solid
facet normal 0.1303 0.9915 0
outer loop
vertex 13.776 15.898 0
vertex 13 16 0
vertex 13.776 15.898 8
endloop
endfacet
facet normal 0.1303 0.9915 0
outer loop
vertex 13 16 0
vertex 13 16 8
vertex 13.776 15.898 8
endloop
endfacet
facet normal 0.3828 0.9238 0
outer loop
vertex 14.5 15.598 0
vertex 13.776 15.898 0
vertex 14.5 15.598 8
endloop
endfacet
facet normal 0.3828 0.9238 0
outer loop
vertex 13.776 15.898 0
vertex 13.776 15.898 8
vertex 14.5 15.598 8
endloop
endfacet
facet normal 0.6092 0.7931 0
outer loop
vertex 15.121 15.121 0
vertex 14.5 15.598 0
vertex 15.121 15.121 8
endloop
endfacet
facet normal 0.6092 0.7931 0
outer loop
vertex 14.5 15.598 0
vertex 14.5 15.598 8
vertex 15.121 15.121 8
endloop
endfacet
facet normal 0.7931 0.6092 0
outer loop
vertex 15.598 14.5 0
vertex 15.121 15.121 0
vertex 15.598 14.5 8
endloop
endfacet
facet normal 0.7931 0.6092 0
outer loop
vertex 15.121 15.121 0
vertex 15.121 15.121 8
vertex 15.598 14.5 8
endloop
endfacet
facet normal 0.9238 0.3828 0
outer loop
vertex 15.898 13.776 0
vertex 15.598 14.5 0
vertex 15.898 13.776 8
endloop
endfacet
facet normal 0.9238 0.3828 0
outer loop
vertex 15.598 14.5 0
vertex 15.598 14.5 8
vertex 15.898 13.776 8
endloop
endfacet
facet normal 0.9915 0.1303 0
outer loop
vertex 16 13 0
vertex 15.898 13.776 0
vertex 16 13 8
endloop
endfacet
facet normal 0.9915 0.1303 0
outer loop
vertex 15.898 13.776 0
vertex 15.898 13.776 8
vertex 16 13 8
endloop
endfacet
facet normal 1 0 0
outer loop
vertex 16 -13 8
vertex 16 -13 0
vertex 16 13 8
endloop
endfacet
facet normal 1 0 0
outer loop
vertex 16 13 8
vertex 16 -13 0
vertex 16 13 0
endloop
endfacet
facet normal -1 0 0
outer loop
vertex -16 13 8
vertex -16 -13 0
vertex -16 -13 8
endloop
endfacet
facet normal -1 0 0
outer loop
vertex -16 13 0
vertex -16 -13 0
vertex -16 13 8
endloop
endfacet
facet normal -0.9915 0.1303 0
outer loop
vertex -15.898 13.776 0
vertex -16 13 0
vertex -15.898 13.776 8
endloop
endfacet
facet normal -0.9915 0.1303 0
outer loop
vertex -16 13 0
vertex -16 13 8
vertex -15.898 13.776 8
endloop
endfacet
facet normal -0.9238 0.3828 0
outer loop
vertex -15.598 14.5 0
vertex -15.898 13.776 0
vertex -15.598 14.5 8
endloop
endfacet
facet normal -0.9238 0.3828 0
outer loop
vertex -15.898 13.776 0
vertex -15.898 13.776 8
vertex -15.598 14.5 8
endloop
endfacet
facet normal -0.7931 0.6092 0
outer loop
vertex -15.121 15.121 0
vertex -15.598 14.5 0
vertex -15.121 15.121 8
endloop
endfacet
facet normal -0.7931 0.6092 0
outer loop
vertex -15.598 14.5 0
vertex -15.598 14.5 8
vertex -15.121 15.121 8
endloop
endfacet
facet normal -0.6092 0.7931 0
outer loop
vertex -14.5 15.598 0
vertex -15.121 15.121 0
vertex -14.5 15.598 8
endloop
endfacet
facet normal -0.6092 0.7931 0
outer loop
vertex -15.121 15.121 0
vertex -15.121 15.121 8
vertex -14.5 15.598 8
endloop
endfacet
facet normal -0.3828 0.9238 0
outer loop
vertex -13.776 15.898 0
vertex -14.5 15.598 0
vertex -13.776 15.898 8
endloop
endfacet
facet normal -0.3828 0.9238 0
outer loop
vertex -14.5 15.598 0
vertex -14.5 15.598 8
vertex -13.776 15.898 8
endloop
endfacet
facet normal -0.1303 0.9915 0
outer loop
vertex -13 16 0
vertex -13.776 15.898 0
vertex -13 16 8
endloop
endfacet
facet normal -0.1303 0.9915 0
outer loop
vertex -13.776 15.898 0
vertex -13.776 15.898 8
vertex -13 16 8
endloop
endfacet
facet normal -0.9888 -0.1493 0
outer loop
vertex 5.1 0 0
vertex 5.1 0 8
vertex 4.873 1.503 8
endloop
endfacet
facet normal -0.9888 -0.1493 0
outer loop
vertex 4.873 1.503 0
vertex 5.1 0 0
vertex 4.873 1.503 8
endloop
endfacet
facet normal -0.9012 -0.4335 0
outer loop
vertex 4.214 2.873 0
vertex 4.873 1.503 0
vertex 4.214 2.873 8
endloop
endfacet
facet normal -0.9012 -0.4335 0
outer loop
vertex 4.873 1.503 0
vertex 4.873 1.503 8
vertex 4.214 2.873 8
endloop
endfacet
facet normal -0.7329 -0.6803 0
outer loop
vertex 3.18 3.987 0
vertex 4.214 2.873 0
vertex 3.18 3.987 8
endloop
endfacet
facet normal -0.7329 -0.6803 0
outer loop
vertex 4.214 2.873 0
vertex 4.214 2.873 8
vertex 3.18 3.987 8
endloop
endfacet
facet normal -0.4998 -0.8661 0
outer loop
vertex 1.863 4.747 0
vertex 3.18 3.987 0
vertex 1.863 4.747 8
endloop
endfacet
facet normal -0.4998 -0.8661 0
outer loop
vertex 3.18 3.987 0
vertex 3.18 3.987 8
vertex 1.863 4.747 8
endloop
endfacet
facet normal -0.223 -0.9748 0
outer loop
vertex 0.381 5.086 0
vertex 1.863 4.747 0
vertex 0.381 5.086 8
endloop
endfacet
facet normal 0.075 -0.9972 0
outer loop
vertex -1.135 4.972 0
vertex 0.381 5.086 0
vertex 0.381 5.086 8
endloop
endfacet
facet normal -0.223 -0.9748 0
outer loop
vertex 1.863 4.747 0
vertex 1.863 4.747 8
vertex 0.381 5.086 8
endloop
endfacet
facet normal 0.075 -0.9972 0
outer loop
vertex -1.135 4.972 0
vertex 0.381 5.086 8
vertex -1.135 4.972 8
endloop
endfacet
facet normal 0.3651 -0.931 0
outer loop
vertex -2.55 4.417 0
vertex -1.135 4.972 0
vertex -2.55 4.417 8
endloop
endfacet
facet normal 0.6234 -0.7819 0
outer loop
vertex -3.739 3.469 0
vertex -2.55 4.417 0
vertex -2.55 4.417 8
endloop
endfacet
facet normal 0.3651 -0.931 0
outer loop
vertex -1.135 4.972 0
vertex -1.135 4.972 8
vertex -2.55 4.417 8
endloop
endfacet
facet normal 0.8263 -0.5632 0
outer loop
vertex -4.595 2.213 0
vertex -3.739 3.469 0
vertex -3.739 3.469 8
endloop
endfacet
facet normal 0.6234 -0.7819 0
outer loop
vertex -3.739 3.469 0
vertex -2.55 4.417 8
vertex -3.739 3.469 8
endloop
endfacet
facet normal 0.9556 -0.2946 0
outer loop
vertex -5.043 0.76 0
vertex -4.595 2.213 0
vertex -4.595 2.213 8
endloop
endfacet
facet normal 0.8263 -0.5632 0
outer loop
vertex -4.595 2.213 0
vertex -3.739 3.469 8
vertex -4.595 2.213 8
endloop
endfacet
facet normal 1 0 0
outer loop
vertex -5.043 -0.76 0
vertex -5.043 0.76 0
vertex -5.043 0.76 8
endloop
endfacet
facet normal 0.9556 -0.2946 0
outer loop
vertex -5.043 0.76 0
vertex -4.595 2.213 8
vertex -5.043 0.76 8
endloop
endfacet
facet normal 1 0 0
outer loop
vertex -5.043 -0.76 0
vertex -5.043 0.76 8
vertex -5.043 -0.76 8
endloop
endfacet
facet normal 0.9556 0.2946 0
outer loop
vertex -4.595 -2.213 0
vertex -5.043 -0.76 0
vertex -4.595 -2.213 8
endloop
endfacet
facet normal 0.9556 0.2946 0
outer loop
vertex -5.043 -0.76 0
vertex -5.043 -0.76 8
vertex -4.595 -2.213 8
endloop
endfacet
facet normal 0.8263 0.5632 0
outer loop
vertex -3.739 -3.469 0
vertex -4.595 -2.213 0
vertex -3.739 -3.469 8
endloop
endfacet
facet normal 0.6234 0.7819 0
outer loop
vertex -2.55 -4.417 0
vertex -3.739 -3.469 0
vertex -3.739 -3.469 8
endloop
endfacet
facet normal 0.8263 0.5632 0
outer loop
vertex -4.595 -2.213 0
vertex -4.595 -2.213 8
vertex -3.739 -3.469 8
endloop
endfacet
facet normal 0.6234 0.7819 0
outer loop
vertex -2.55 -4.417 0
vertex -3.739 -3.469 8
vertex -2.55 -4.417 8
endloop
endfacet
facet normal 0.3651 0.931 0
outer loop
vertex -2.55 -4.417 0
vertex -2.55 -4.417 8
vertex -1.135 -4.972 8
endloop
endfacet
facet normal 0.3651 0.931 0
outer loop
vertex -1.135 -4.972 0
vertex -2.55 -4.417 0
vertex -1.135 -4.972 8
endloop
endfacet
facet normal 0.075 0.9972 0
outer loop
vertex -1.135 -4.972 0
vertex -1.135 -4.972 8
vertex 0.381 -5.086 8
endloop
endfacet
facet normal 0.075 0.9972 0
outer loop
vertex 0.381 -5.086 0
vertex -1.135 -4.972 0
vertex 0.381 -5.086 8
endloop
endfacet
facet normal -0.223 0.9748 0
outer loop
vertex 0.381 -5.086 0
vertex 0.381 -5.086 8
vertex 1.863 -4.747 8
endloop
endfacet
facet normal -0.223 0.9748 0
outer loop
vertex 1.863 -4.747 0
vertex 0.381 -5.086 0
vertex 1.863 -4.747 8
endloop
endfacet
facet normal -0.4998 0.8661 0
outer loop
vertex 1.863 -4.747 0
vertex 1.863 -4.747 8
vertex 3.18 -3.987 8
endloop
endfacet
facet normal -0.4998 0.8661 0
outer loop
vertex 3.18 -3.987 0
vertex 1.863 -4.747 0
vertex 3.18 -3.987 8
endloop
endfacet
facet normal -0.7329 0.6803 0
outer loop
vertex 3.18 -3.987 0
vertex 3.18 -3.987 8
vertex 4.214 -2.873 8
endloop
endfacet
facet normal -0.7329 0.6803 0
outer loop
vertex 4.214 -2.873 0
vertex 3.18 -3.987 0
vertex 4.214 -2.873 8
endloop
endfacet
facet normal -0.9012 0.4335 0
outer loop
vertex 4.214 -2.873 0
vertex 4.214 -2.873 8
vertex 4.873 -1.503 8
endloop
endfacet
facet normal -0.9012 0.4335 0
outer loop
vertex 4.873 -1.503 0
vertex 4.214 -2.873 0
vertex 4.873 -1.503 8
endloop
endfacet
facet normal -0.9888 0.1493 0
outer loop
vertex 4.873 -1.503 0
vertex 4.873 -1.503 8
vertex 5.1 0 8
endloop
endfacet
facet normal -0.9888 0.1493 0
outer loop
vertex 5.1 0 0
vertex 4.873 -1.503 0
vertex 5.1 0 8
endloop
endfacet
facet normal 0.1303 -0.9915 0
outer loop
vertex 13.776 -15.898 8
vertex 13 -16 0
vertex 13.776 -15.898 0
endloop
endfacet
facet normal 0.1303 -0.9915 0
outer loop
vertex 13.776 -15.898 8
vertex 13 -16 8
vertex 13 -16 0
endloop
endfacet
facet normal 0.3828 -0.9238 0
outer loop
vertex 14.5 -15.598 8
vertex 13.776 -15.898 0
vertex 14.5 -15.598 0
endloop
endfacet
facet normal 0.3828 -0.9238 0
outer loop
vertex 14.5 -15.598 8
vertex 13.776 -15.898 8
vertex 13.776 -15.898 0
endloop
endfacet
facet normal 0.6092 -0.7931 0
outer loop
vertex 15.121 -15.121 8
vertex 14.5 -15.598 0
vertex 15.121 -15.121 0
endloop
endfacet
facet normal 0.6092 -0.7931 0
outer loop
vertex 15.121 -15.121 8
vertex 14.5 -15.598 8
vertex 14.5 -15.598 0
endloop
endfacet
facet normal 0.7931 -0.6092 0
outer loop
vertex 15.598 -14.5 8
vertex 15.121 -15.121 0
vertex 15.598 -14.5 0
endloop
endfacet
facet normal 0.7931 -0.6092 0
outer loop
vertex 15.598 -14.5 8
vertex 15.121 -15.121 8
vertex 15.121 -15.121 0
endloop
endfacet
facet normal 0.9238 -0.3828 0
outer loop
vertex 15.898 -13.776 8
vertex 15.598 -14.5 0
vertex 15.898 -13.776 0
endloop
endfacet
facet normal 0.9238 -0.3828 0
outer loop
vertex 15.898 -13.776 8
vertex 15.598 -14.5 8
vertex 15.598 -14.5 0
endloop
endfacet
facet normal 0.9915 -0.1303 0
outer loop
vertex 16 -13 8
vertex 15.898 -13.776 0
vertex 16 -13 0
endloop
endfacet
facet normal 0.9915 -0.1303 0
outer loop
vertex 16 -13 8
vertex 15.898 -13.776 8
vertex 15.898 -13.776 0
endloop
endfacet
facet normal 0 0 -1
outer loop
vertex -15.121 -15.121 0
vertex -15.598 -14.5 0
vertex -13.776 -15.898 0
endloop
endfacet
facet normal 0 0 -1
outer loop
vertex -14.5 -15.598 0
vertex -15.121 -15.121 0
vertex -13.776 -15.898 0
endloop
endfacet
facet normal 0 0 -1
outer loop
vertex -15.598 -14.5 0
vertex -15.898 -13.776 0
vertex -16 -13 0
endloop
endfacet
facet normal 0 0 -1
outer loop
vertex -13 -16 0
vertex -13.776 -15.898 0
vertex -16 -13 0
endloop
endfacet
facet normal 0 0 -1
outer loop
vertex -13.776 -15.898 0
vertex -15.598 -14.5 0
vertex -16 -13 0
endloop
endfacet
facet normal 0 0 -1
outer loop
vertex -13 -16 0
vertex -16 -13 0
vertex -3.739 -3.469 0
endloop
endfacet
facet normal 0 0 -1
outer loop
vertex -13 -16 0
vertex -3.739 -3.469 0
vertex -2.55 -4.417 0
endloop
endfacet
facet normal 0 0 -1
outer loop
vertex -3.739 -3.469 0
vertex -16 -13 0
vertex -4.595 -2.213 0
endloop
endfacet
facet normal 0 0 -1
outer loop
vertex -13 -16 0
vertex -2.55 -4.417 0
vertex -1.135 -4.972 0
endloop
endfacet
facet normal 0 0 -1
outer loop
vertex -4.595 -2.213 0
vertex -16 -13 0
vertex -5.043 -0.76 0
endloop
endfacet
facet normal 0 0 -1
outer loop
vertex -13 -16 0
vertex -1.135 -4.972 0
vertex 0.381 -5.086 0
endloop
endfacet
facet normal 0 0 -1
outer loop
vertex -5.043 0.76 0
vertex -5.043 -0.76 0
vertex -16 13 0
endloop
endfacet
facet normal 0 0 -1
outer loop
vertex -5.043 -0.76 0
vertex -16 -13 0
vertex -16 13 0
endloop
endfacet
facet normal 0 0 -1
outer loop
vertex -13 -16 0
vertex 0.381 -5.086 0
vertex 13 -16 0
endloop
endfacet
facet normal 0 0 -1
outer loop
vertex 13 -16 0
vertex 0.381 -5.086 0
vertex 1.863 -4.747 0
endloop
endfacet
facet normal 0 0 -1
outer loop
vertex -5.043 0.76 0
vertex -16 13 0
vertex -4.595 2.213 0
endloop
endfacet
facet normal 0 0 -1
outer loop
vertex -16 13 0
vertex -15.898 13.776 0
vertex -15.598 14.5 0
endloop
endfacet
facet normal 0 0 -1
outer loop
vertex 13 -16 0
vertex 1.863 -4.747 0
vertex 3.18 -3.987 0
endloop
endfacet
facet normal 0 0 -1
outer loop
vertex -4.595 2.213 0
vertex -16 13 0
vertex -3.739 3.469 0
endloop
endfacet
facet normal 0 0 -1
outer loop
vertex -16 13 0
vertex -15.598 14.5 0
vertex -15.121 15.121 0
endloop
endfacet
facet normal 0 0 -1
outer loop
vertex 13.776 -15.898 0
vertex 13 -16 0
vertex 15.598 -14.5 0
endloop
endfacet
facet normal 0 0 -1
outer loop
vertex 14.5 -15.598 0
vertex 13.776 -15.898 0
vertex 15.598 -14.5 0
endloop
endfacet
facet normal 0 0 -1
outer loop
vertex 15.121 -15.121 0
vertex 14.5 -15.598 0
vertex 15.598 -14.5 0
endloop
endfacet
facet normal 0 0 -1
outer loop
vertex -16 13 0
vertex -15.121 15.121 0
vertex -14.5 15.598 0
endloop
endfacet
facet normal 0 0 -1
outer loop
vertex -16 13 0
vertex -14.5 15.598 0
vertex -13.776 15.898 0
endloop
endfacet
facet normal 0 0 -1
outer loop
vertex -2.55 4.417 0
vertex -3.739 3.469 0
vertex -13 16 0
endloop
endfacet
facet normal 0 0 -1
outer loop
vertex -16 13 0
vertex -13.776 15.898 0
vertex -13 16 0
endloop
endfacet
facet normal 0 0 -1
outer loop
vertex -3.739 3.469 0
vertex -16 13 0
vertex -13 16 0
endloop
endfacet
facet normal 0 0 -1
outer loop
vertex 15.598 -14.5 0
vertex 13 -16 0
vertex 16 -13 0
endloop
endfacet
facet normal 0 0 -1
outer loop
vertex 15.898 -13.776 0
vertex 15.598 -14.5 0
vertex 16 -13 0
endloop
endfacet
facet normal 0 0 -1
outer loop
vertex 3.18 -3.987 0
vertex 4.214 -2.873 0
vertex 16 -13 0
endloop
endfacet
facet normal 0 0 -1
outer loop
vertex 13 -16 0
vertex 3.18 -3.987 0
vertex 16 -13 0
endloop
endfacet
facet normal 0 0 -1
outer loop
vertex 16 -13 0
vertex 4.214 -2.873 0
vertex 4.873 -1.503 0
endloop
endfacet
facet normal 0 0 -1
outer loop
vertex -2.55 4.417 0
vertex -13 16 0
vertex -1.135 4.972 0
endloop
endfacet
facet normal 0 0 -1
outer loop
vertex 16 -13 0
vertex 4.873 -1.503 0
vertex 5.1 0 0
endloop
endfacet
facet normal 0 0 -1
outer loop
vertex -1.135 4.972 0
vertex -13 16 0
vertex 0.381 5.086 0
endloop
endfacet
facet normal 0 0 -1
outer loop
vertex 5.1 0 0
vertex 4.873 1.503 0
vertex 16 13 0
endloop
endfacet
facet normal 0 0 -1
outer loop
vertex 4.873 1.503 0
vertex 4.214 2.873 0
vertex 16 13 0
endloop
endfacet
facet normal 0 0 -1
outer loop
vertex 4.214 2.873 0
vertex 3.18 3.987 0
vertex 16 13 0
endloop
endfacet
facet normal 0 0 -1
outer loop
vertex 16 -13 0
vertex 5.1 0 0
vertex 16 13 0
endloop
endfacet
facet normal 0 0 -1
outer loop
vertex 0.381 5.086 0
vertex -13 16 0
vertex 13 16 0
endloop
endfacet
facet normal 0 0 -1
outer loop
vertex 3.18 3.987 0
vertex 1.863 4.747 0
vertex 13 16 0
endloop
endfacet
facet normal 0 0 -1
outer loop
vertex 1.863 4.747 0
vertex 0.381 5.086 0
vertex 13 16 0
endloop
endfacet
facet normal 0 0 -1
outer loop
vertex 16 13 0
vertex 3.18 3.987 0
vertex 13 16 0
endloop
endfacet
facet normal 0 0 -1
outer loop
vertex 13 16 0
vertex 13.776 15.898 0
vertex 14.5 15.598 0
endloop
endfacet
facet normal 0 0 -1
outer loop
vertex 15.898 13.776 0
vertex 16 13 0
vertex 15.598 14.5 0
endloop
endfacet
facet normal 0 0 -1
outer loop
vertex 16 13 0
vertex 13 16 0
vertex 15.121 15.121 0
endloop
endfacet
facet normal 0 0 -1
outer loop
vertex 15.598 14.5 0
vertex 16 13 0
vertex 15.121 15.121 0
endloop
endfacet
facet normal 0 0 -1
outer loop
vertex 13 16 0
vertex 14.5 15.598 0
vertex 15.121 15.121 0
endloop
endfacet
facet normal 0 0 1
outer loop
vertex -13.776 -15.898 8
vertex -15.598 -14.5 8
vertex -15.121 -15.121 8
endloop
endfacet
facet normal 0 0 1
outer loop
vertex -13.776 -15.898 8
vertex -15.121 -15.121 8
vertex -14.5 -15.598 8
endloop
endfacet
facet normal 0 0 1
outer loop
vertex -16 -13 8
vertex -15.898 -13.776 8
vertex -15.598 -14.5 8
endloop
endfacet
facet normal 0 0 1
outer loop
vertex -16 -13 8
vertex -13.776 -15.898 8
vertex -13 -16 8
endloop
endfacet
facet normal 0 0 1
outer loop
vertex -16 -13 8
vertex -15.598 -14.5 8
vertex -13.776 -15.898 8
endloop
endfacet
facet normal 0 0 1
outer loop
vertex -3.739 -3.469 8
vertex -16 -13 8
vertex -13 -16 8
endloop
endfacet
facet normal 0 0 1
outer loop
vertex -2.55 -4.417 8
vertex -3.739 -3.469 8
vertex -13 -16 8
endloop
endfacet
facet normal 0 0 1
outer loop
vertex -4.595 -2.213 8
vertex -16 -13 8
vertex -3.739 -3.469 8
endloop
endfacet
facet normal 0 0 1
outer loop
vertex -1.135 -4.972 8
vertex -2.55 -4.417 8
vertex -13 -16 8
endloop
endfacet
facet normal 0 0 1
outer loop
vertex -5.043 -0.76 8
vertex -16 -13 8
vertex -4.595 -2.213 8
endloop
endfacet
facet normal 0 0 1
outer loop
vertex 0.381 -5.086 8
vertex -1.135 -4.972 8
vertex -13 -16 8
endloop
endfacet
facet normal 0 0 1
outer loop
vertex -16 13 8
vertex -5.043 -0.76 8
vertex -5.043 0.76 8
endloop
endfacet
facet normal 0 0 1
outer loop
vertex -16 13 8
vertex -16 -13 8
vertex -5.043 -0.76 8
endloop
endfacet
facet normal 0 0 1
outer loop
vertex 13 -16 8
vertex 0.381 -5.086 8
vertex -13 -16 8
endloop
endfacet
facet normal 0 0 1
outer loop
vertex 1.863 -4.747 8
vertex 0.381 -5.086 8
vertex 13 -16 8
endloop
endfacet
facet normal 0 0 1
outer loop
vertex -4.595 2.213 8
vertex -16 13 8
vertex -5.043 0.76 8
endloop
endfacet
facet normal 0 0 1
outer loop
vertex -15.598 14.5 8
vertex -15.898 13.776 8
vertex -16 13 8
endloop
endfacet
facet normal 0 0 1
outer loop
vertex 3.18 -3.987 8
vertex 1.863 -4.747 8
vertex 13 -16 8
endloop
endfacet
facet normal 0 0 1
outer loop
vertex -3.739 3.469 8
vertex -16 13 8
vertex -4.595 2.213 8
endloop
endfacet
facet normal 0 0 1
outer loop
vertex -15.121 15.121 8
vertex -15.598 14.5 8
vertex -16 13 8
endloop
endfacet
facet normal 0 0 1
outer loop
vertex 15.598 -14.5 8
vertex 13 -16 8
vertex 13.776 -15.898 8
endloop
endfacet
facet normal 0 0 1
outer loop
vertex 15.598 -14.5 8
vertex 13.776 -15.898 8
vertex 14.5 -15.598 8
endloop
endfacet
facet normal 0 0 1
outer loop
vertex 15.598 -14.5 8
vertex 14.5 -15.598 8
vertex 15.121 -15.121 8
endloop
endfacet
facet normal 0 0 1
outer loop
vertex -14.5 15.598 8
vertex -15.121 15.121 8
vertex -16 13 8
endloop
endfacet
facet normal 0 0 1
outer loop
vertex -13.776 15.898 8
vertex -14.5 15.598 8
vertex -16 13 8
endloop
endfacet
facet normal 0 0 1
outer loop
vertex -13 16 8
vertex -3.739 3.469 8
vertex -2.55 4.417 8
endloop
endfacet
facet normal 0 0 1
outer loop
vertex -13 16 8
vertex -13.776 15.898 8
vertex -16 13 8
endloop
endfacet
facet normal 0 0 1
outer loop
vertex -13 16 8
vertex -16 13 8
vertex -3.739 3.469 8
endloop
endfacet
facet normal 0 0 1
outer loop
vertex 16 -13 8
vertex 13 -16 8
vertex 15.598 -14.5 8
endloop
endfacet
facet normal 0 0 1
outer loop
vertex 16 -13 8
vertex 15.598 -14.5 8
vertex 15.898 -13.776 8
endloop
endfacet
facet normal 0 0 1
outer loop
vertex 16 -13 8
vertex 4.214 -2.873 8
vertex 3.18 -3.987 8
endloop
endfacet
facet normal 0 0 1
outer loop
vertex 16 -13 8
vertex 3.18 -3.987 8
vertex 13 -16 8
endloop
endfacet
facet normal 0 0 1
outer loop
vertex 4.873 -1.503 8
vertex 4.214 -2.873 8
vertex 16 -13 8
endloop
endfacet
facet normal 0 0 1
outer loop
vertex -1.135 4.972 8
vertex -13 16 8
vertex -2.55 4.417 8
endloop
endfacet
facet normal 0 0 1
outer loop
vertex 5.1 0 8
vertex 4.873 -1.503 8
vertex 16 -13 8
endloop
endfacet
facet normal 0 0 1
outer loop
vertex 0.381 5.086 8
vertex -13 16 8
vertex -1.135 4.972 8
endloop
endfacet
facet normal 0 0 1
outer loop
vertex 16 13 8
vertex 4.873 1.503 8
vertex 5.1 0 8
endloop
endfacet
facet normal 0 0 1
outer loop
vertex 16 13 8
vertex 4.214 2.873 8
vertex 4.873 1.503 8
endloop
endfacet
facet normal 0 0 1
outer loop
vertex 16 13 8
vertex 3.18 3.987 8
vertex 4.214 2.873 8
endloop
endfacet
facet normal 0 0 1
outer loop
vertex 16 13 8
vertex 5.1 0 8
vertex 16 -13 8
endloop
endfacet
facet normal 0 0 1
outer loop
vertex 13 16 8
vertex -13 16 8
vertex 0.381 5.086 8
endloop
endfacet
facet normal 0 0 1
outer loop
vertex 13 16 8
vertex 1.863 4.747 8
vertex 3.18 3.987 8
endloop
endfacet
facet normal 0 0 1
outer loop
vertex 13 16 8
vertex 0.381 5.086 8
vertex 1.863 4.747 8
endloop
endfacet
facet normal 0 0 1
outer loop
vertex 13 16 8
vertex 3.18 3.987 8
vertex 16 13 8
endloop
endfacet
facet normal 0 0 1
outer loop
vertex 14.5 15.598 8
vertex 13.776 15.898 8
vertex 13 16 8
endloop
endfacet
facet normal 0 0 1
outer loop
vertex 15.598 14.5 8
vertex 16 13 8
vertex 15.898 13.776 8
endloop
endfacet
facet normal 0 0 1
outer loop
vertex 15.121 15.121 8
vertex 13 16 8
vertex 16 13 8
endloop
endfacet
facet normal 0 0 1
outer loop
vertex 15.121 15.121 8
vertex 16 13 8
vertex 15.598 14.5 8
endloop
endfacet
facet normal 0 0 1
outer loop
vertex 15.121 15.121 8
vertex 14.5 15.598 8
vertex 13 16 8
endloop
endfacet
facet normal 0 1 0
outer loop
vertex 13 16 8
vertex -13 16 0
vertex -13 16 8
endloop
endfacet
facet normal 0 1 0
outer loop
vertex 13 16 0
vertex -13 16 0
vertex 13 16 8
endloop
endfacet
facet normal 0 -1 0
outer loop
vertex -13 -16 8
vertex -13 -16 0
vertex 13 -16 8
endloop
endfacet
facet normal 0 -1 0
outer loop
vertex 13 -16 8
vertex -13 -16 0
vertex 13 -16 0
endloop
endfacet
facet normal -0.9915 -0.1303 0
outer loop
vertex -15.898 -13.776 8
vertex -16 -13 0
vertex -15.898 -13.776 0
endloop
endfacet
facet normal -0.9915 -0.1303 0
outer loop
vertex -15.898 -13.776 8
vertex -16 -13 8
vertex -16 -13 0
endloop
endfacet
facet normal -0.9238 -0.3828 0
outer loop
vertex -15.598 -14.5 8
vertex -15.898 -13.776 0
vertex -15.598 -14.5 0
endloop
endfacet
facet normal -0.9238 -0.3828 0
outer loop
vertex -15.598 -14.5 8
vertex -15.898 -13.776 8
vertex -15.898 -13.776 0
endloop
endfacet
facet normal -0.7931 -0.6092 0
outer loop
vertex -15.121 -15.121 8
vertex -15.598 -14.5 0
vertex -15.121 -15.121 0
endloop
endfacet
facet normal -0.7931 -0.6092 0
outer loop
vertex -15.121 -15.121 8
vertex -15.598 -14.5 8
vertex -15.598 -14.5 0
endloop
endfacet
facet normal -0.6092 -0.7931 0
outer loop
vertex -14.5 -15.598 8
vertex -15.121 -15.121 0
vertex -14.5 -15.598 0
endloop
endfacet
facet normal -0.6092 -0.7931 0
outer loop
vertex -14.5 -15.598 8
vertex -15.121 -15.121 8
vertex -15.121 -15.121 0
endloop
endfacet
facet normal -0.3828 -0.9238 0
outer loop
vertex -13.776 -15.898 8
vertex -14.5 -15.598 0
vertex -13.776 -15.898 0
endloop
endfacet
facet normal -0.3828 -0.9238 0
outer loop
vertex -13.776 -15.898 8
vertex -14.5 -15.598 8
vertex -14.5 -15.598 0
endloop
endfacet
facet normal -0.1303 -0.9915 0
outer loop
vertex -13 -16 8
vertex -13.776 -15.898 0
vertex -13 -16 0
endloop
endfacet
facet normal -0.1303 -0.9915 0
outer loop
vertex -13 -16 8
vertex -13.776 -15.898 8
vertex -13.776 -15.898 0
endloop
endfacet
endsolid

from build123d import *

# Parameters (mm, degrees)
SKETCH_1_W          = 32
SKETCH_1_H          = 32
EXTRUDE_1_DEPTH     = 8
SKETCH_2_R          = 5.1
CUT_EXTRUDE_1_DEPTH = 25
FILLET_1_R          = 3


with BuildPart() as part:
    # Эскиз1 → Бобышка-Вытянуть1 (new body)
    with BuildSketch(Plane.XY):
        Rectangle(SKETCH_1_W, SKETCH_1_H)
    extrude(amount=EXTRUDE_1_DEPTH)

    # Эскиз2 → Вырез-Вытянуть1 (cut, through all)
    with BuildSketch(Plane.XY.offset(8)):
        Circle(SKETCH_2_R)
    extrude(amount=-CUT_EXTRUDE_1_DEPTH, mode=Mode.SUBTRACT)

    # Скругление1
    fillet_1_edges = [part.edges().sort_by_distance(p)[0] for p in [
        (16, -16, 4),
        (-16, -16, 4),
        (-16, 16, 4),
        (16, 16, 4),
    ]]
    fillet(fillet_1_edges, radius=FILLET_1_R)


solid = part.part
